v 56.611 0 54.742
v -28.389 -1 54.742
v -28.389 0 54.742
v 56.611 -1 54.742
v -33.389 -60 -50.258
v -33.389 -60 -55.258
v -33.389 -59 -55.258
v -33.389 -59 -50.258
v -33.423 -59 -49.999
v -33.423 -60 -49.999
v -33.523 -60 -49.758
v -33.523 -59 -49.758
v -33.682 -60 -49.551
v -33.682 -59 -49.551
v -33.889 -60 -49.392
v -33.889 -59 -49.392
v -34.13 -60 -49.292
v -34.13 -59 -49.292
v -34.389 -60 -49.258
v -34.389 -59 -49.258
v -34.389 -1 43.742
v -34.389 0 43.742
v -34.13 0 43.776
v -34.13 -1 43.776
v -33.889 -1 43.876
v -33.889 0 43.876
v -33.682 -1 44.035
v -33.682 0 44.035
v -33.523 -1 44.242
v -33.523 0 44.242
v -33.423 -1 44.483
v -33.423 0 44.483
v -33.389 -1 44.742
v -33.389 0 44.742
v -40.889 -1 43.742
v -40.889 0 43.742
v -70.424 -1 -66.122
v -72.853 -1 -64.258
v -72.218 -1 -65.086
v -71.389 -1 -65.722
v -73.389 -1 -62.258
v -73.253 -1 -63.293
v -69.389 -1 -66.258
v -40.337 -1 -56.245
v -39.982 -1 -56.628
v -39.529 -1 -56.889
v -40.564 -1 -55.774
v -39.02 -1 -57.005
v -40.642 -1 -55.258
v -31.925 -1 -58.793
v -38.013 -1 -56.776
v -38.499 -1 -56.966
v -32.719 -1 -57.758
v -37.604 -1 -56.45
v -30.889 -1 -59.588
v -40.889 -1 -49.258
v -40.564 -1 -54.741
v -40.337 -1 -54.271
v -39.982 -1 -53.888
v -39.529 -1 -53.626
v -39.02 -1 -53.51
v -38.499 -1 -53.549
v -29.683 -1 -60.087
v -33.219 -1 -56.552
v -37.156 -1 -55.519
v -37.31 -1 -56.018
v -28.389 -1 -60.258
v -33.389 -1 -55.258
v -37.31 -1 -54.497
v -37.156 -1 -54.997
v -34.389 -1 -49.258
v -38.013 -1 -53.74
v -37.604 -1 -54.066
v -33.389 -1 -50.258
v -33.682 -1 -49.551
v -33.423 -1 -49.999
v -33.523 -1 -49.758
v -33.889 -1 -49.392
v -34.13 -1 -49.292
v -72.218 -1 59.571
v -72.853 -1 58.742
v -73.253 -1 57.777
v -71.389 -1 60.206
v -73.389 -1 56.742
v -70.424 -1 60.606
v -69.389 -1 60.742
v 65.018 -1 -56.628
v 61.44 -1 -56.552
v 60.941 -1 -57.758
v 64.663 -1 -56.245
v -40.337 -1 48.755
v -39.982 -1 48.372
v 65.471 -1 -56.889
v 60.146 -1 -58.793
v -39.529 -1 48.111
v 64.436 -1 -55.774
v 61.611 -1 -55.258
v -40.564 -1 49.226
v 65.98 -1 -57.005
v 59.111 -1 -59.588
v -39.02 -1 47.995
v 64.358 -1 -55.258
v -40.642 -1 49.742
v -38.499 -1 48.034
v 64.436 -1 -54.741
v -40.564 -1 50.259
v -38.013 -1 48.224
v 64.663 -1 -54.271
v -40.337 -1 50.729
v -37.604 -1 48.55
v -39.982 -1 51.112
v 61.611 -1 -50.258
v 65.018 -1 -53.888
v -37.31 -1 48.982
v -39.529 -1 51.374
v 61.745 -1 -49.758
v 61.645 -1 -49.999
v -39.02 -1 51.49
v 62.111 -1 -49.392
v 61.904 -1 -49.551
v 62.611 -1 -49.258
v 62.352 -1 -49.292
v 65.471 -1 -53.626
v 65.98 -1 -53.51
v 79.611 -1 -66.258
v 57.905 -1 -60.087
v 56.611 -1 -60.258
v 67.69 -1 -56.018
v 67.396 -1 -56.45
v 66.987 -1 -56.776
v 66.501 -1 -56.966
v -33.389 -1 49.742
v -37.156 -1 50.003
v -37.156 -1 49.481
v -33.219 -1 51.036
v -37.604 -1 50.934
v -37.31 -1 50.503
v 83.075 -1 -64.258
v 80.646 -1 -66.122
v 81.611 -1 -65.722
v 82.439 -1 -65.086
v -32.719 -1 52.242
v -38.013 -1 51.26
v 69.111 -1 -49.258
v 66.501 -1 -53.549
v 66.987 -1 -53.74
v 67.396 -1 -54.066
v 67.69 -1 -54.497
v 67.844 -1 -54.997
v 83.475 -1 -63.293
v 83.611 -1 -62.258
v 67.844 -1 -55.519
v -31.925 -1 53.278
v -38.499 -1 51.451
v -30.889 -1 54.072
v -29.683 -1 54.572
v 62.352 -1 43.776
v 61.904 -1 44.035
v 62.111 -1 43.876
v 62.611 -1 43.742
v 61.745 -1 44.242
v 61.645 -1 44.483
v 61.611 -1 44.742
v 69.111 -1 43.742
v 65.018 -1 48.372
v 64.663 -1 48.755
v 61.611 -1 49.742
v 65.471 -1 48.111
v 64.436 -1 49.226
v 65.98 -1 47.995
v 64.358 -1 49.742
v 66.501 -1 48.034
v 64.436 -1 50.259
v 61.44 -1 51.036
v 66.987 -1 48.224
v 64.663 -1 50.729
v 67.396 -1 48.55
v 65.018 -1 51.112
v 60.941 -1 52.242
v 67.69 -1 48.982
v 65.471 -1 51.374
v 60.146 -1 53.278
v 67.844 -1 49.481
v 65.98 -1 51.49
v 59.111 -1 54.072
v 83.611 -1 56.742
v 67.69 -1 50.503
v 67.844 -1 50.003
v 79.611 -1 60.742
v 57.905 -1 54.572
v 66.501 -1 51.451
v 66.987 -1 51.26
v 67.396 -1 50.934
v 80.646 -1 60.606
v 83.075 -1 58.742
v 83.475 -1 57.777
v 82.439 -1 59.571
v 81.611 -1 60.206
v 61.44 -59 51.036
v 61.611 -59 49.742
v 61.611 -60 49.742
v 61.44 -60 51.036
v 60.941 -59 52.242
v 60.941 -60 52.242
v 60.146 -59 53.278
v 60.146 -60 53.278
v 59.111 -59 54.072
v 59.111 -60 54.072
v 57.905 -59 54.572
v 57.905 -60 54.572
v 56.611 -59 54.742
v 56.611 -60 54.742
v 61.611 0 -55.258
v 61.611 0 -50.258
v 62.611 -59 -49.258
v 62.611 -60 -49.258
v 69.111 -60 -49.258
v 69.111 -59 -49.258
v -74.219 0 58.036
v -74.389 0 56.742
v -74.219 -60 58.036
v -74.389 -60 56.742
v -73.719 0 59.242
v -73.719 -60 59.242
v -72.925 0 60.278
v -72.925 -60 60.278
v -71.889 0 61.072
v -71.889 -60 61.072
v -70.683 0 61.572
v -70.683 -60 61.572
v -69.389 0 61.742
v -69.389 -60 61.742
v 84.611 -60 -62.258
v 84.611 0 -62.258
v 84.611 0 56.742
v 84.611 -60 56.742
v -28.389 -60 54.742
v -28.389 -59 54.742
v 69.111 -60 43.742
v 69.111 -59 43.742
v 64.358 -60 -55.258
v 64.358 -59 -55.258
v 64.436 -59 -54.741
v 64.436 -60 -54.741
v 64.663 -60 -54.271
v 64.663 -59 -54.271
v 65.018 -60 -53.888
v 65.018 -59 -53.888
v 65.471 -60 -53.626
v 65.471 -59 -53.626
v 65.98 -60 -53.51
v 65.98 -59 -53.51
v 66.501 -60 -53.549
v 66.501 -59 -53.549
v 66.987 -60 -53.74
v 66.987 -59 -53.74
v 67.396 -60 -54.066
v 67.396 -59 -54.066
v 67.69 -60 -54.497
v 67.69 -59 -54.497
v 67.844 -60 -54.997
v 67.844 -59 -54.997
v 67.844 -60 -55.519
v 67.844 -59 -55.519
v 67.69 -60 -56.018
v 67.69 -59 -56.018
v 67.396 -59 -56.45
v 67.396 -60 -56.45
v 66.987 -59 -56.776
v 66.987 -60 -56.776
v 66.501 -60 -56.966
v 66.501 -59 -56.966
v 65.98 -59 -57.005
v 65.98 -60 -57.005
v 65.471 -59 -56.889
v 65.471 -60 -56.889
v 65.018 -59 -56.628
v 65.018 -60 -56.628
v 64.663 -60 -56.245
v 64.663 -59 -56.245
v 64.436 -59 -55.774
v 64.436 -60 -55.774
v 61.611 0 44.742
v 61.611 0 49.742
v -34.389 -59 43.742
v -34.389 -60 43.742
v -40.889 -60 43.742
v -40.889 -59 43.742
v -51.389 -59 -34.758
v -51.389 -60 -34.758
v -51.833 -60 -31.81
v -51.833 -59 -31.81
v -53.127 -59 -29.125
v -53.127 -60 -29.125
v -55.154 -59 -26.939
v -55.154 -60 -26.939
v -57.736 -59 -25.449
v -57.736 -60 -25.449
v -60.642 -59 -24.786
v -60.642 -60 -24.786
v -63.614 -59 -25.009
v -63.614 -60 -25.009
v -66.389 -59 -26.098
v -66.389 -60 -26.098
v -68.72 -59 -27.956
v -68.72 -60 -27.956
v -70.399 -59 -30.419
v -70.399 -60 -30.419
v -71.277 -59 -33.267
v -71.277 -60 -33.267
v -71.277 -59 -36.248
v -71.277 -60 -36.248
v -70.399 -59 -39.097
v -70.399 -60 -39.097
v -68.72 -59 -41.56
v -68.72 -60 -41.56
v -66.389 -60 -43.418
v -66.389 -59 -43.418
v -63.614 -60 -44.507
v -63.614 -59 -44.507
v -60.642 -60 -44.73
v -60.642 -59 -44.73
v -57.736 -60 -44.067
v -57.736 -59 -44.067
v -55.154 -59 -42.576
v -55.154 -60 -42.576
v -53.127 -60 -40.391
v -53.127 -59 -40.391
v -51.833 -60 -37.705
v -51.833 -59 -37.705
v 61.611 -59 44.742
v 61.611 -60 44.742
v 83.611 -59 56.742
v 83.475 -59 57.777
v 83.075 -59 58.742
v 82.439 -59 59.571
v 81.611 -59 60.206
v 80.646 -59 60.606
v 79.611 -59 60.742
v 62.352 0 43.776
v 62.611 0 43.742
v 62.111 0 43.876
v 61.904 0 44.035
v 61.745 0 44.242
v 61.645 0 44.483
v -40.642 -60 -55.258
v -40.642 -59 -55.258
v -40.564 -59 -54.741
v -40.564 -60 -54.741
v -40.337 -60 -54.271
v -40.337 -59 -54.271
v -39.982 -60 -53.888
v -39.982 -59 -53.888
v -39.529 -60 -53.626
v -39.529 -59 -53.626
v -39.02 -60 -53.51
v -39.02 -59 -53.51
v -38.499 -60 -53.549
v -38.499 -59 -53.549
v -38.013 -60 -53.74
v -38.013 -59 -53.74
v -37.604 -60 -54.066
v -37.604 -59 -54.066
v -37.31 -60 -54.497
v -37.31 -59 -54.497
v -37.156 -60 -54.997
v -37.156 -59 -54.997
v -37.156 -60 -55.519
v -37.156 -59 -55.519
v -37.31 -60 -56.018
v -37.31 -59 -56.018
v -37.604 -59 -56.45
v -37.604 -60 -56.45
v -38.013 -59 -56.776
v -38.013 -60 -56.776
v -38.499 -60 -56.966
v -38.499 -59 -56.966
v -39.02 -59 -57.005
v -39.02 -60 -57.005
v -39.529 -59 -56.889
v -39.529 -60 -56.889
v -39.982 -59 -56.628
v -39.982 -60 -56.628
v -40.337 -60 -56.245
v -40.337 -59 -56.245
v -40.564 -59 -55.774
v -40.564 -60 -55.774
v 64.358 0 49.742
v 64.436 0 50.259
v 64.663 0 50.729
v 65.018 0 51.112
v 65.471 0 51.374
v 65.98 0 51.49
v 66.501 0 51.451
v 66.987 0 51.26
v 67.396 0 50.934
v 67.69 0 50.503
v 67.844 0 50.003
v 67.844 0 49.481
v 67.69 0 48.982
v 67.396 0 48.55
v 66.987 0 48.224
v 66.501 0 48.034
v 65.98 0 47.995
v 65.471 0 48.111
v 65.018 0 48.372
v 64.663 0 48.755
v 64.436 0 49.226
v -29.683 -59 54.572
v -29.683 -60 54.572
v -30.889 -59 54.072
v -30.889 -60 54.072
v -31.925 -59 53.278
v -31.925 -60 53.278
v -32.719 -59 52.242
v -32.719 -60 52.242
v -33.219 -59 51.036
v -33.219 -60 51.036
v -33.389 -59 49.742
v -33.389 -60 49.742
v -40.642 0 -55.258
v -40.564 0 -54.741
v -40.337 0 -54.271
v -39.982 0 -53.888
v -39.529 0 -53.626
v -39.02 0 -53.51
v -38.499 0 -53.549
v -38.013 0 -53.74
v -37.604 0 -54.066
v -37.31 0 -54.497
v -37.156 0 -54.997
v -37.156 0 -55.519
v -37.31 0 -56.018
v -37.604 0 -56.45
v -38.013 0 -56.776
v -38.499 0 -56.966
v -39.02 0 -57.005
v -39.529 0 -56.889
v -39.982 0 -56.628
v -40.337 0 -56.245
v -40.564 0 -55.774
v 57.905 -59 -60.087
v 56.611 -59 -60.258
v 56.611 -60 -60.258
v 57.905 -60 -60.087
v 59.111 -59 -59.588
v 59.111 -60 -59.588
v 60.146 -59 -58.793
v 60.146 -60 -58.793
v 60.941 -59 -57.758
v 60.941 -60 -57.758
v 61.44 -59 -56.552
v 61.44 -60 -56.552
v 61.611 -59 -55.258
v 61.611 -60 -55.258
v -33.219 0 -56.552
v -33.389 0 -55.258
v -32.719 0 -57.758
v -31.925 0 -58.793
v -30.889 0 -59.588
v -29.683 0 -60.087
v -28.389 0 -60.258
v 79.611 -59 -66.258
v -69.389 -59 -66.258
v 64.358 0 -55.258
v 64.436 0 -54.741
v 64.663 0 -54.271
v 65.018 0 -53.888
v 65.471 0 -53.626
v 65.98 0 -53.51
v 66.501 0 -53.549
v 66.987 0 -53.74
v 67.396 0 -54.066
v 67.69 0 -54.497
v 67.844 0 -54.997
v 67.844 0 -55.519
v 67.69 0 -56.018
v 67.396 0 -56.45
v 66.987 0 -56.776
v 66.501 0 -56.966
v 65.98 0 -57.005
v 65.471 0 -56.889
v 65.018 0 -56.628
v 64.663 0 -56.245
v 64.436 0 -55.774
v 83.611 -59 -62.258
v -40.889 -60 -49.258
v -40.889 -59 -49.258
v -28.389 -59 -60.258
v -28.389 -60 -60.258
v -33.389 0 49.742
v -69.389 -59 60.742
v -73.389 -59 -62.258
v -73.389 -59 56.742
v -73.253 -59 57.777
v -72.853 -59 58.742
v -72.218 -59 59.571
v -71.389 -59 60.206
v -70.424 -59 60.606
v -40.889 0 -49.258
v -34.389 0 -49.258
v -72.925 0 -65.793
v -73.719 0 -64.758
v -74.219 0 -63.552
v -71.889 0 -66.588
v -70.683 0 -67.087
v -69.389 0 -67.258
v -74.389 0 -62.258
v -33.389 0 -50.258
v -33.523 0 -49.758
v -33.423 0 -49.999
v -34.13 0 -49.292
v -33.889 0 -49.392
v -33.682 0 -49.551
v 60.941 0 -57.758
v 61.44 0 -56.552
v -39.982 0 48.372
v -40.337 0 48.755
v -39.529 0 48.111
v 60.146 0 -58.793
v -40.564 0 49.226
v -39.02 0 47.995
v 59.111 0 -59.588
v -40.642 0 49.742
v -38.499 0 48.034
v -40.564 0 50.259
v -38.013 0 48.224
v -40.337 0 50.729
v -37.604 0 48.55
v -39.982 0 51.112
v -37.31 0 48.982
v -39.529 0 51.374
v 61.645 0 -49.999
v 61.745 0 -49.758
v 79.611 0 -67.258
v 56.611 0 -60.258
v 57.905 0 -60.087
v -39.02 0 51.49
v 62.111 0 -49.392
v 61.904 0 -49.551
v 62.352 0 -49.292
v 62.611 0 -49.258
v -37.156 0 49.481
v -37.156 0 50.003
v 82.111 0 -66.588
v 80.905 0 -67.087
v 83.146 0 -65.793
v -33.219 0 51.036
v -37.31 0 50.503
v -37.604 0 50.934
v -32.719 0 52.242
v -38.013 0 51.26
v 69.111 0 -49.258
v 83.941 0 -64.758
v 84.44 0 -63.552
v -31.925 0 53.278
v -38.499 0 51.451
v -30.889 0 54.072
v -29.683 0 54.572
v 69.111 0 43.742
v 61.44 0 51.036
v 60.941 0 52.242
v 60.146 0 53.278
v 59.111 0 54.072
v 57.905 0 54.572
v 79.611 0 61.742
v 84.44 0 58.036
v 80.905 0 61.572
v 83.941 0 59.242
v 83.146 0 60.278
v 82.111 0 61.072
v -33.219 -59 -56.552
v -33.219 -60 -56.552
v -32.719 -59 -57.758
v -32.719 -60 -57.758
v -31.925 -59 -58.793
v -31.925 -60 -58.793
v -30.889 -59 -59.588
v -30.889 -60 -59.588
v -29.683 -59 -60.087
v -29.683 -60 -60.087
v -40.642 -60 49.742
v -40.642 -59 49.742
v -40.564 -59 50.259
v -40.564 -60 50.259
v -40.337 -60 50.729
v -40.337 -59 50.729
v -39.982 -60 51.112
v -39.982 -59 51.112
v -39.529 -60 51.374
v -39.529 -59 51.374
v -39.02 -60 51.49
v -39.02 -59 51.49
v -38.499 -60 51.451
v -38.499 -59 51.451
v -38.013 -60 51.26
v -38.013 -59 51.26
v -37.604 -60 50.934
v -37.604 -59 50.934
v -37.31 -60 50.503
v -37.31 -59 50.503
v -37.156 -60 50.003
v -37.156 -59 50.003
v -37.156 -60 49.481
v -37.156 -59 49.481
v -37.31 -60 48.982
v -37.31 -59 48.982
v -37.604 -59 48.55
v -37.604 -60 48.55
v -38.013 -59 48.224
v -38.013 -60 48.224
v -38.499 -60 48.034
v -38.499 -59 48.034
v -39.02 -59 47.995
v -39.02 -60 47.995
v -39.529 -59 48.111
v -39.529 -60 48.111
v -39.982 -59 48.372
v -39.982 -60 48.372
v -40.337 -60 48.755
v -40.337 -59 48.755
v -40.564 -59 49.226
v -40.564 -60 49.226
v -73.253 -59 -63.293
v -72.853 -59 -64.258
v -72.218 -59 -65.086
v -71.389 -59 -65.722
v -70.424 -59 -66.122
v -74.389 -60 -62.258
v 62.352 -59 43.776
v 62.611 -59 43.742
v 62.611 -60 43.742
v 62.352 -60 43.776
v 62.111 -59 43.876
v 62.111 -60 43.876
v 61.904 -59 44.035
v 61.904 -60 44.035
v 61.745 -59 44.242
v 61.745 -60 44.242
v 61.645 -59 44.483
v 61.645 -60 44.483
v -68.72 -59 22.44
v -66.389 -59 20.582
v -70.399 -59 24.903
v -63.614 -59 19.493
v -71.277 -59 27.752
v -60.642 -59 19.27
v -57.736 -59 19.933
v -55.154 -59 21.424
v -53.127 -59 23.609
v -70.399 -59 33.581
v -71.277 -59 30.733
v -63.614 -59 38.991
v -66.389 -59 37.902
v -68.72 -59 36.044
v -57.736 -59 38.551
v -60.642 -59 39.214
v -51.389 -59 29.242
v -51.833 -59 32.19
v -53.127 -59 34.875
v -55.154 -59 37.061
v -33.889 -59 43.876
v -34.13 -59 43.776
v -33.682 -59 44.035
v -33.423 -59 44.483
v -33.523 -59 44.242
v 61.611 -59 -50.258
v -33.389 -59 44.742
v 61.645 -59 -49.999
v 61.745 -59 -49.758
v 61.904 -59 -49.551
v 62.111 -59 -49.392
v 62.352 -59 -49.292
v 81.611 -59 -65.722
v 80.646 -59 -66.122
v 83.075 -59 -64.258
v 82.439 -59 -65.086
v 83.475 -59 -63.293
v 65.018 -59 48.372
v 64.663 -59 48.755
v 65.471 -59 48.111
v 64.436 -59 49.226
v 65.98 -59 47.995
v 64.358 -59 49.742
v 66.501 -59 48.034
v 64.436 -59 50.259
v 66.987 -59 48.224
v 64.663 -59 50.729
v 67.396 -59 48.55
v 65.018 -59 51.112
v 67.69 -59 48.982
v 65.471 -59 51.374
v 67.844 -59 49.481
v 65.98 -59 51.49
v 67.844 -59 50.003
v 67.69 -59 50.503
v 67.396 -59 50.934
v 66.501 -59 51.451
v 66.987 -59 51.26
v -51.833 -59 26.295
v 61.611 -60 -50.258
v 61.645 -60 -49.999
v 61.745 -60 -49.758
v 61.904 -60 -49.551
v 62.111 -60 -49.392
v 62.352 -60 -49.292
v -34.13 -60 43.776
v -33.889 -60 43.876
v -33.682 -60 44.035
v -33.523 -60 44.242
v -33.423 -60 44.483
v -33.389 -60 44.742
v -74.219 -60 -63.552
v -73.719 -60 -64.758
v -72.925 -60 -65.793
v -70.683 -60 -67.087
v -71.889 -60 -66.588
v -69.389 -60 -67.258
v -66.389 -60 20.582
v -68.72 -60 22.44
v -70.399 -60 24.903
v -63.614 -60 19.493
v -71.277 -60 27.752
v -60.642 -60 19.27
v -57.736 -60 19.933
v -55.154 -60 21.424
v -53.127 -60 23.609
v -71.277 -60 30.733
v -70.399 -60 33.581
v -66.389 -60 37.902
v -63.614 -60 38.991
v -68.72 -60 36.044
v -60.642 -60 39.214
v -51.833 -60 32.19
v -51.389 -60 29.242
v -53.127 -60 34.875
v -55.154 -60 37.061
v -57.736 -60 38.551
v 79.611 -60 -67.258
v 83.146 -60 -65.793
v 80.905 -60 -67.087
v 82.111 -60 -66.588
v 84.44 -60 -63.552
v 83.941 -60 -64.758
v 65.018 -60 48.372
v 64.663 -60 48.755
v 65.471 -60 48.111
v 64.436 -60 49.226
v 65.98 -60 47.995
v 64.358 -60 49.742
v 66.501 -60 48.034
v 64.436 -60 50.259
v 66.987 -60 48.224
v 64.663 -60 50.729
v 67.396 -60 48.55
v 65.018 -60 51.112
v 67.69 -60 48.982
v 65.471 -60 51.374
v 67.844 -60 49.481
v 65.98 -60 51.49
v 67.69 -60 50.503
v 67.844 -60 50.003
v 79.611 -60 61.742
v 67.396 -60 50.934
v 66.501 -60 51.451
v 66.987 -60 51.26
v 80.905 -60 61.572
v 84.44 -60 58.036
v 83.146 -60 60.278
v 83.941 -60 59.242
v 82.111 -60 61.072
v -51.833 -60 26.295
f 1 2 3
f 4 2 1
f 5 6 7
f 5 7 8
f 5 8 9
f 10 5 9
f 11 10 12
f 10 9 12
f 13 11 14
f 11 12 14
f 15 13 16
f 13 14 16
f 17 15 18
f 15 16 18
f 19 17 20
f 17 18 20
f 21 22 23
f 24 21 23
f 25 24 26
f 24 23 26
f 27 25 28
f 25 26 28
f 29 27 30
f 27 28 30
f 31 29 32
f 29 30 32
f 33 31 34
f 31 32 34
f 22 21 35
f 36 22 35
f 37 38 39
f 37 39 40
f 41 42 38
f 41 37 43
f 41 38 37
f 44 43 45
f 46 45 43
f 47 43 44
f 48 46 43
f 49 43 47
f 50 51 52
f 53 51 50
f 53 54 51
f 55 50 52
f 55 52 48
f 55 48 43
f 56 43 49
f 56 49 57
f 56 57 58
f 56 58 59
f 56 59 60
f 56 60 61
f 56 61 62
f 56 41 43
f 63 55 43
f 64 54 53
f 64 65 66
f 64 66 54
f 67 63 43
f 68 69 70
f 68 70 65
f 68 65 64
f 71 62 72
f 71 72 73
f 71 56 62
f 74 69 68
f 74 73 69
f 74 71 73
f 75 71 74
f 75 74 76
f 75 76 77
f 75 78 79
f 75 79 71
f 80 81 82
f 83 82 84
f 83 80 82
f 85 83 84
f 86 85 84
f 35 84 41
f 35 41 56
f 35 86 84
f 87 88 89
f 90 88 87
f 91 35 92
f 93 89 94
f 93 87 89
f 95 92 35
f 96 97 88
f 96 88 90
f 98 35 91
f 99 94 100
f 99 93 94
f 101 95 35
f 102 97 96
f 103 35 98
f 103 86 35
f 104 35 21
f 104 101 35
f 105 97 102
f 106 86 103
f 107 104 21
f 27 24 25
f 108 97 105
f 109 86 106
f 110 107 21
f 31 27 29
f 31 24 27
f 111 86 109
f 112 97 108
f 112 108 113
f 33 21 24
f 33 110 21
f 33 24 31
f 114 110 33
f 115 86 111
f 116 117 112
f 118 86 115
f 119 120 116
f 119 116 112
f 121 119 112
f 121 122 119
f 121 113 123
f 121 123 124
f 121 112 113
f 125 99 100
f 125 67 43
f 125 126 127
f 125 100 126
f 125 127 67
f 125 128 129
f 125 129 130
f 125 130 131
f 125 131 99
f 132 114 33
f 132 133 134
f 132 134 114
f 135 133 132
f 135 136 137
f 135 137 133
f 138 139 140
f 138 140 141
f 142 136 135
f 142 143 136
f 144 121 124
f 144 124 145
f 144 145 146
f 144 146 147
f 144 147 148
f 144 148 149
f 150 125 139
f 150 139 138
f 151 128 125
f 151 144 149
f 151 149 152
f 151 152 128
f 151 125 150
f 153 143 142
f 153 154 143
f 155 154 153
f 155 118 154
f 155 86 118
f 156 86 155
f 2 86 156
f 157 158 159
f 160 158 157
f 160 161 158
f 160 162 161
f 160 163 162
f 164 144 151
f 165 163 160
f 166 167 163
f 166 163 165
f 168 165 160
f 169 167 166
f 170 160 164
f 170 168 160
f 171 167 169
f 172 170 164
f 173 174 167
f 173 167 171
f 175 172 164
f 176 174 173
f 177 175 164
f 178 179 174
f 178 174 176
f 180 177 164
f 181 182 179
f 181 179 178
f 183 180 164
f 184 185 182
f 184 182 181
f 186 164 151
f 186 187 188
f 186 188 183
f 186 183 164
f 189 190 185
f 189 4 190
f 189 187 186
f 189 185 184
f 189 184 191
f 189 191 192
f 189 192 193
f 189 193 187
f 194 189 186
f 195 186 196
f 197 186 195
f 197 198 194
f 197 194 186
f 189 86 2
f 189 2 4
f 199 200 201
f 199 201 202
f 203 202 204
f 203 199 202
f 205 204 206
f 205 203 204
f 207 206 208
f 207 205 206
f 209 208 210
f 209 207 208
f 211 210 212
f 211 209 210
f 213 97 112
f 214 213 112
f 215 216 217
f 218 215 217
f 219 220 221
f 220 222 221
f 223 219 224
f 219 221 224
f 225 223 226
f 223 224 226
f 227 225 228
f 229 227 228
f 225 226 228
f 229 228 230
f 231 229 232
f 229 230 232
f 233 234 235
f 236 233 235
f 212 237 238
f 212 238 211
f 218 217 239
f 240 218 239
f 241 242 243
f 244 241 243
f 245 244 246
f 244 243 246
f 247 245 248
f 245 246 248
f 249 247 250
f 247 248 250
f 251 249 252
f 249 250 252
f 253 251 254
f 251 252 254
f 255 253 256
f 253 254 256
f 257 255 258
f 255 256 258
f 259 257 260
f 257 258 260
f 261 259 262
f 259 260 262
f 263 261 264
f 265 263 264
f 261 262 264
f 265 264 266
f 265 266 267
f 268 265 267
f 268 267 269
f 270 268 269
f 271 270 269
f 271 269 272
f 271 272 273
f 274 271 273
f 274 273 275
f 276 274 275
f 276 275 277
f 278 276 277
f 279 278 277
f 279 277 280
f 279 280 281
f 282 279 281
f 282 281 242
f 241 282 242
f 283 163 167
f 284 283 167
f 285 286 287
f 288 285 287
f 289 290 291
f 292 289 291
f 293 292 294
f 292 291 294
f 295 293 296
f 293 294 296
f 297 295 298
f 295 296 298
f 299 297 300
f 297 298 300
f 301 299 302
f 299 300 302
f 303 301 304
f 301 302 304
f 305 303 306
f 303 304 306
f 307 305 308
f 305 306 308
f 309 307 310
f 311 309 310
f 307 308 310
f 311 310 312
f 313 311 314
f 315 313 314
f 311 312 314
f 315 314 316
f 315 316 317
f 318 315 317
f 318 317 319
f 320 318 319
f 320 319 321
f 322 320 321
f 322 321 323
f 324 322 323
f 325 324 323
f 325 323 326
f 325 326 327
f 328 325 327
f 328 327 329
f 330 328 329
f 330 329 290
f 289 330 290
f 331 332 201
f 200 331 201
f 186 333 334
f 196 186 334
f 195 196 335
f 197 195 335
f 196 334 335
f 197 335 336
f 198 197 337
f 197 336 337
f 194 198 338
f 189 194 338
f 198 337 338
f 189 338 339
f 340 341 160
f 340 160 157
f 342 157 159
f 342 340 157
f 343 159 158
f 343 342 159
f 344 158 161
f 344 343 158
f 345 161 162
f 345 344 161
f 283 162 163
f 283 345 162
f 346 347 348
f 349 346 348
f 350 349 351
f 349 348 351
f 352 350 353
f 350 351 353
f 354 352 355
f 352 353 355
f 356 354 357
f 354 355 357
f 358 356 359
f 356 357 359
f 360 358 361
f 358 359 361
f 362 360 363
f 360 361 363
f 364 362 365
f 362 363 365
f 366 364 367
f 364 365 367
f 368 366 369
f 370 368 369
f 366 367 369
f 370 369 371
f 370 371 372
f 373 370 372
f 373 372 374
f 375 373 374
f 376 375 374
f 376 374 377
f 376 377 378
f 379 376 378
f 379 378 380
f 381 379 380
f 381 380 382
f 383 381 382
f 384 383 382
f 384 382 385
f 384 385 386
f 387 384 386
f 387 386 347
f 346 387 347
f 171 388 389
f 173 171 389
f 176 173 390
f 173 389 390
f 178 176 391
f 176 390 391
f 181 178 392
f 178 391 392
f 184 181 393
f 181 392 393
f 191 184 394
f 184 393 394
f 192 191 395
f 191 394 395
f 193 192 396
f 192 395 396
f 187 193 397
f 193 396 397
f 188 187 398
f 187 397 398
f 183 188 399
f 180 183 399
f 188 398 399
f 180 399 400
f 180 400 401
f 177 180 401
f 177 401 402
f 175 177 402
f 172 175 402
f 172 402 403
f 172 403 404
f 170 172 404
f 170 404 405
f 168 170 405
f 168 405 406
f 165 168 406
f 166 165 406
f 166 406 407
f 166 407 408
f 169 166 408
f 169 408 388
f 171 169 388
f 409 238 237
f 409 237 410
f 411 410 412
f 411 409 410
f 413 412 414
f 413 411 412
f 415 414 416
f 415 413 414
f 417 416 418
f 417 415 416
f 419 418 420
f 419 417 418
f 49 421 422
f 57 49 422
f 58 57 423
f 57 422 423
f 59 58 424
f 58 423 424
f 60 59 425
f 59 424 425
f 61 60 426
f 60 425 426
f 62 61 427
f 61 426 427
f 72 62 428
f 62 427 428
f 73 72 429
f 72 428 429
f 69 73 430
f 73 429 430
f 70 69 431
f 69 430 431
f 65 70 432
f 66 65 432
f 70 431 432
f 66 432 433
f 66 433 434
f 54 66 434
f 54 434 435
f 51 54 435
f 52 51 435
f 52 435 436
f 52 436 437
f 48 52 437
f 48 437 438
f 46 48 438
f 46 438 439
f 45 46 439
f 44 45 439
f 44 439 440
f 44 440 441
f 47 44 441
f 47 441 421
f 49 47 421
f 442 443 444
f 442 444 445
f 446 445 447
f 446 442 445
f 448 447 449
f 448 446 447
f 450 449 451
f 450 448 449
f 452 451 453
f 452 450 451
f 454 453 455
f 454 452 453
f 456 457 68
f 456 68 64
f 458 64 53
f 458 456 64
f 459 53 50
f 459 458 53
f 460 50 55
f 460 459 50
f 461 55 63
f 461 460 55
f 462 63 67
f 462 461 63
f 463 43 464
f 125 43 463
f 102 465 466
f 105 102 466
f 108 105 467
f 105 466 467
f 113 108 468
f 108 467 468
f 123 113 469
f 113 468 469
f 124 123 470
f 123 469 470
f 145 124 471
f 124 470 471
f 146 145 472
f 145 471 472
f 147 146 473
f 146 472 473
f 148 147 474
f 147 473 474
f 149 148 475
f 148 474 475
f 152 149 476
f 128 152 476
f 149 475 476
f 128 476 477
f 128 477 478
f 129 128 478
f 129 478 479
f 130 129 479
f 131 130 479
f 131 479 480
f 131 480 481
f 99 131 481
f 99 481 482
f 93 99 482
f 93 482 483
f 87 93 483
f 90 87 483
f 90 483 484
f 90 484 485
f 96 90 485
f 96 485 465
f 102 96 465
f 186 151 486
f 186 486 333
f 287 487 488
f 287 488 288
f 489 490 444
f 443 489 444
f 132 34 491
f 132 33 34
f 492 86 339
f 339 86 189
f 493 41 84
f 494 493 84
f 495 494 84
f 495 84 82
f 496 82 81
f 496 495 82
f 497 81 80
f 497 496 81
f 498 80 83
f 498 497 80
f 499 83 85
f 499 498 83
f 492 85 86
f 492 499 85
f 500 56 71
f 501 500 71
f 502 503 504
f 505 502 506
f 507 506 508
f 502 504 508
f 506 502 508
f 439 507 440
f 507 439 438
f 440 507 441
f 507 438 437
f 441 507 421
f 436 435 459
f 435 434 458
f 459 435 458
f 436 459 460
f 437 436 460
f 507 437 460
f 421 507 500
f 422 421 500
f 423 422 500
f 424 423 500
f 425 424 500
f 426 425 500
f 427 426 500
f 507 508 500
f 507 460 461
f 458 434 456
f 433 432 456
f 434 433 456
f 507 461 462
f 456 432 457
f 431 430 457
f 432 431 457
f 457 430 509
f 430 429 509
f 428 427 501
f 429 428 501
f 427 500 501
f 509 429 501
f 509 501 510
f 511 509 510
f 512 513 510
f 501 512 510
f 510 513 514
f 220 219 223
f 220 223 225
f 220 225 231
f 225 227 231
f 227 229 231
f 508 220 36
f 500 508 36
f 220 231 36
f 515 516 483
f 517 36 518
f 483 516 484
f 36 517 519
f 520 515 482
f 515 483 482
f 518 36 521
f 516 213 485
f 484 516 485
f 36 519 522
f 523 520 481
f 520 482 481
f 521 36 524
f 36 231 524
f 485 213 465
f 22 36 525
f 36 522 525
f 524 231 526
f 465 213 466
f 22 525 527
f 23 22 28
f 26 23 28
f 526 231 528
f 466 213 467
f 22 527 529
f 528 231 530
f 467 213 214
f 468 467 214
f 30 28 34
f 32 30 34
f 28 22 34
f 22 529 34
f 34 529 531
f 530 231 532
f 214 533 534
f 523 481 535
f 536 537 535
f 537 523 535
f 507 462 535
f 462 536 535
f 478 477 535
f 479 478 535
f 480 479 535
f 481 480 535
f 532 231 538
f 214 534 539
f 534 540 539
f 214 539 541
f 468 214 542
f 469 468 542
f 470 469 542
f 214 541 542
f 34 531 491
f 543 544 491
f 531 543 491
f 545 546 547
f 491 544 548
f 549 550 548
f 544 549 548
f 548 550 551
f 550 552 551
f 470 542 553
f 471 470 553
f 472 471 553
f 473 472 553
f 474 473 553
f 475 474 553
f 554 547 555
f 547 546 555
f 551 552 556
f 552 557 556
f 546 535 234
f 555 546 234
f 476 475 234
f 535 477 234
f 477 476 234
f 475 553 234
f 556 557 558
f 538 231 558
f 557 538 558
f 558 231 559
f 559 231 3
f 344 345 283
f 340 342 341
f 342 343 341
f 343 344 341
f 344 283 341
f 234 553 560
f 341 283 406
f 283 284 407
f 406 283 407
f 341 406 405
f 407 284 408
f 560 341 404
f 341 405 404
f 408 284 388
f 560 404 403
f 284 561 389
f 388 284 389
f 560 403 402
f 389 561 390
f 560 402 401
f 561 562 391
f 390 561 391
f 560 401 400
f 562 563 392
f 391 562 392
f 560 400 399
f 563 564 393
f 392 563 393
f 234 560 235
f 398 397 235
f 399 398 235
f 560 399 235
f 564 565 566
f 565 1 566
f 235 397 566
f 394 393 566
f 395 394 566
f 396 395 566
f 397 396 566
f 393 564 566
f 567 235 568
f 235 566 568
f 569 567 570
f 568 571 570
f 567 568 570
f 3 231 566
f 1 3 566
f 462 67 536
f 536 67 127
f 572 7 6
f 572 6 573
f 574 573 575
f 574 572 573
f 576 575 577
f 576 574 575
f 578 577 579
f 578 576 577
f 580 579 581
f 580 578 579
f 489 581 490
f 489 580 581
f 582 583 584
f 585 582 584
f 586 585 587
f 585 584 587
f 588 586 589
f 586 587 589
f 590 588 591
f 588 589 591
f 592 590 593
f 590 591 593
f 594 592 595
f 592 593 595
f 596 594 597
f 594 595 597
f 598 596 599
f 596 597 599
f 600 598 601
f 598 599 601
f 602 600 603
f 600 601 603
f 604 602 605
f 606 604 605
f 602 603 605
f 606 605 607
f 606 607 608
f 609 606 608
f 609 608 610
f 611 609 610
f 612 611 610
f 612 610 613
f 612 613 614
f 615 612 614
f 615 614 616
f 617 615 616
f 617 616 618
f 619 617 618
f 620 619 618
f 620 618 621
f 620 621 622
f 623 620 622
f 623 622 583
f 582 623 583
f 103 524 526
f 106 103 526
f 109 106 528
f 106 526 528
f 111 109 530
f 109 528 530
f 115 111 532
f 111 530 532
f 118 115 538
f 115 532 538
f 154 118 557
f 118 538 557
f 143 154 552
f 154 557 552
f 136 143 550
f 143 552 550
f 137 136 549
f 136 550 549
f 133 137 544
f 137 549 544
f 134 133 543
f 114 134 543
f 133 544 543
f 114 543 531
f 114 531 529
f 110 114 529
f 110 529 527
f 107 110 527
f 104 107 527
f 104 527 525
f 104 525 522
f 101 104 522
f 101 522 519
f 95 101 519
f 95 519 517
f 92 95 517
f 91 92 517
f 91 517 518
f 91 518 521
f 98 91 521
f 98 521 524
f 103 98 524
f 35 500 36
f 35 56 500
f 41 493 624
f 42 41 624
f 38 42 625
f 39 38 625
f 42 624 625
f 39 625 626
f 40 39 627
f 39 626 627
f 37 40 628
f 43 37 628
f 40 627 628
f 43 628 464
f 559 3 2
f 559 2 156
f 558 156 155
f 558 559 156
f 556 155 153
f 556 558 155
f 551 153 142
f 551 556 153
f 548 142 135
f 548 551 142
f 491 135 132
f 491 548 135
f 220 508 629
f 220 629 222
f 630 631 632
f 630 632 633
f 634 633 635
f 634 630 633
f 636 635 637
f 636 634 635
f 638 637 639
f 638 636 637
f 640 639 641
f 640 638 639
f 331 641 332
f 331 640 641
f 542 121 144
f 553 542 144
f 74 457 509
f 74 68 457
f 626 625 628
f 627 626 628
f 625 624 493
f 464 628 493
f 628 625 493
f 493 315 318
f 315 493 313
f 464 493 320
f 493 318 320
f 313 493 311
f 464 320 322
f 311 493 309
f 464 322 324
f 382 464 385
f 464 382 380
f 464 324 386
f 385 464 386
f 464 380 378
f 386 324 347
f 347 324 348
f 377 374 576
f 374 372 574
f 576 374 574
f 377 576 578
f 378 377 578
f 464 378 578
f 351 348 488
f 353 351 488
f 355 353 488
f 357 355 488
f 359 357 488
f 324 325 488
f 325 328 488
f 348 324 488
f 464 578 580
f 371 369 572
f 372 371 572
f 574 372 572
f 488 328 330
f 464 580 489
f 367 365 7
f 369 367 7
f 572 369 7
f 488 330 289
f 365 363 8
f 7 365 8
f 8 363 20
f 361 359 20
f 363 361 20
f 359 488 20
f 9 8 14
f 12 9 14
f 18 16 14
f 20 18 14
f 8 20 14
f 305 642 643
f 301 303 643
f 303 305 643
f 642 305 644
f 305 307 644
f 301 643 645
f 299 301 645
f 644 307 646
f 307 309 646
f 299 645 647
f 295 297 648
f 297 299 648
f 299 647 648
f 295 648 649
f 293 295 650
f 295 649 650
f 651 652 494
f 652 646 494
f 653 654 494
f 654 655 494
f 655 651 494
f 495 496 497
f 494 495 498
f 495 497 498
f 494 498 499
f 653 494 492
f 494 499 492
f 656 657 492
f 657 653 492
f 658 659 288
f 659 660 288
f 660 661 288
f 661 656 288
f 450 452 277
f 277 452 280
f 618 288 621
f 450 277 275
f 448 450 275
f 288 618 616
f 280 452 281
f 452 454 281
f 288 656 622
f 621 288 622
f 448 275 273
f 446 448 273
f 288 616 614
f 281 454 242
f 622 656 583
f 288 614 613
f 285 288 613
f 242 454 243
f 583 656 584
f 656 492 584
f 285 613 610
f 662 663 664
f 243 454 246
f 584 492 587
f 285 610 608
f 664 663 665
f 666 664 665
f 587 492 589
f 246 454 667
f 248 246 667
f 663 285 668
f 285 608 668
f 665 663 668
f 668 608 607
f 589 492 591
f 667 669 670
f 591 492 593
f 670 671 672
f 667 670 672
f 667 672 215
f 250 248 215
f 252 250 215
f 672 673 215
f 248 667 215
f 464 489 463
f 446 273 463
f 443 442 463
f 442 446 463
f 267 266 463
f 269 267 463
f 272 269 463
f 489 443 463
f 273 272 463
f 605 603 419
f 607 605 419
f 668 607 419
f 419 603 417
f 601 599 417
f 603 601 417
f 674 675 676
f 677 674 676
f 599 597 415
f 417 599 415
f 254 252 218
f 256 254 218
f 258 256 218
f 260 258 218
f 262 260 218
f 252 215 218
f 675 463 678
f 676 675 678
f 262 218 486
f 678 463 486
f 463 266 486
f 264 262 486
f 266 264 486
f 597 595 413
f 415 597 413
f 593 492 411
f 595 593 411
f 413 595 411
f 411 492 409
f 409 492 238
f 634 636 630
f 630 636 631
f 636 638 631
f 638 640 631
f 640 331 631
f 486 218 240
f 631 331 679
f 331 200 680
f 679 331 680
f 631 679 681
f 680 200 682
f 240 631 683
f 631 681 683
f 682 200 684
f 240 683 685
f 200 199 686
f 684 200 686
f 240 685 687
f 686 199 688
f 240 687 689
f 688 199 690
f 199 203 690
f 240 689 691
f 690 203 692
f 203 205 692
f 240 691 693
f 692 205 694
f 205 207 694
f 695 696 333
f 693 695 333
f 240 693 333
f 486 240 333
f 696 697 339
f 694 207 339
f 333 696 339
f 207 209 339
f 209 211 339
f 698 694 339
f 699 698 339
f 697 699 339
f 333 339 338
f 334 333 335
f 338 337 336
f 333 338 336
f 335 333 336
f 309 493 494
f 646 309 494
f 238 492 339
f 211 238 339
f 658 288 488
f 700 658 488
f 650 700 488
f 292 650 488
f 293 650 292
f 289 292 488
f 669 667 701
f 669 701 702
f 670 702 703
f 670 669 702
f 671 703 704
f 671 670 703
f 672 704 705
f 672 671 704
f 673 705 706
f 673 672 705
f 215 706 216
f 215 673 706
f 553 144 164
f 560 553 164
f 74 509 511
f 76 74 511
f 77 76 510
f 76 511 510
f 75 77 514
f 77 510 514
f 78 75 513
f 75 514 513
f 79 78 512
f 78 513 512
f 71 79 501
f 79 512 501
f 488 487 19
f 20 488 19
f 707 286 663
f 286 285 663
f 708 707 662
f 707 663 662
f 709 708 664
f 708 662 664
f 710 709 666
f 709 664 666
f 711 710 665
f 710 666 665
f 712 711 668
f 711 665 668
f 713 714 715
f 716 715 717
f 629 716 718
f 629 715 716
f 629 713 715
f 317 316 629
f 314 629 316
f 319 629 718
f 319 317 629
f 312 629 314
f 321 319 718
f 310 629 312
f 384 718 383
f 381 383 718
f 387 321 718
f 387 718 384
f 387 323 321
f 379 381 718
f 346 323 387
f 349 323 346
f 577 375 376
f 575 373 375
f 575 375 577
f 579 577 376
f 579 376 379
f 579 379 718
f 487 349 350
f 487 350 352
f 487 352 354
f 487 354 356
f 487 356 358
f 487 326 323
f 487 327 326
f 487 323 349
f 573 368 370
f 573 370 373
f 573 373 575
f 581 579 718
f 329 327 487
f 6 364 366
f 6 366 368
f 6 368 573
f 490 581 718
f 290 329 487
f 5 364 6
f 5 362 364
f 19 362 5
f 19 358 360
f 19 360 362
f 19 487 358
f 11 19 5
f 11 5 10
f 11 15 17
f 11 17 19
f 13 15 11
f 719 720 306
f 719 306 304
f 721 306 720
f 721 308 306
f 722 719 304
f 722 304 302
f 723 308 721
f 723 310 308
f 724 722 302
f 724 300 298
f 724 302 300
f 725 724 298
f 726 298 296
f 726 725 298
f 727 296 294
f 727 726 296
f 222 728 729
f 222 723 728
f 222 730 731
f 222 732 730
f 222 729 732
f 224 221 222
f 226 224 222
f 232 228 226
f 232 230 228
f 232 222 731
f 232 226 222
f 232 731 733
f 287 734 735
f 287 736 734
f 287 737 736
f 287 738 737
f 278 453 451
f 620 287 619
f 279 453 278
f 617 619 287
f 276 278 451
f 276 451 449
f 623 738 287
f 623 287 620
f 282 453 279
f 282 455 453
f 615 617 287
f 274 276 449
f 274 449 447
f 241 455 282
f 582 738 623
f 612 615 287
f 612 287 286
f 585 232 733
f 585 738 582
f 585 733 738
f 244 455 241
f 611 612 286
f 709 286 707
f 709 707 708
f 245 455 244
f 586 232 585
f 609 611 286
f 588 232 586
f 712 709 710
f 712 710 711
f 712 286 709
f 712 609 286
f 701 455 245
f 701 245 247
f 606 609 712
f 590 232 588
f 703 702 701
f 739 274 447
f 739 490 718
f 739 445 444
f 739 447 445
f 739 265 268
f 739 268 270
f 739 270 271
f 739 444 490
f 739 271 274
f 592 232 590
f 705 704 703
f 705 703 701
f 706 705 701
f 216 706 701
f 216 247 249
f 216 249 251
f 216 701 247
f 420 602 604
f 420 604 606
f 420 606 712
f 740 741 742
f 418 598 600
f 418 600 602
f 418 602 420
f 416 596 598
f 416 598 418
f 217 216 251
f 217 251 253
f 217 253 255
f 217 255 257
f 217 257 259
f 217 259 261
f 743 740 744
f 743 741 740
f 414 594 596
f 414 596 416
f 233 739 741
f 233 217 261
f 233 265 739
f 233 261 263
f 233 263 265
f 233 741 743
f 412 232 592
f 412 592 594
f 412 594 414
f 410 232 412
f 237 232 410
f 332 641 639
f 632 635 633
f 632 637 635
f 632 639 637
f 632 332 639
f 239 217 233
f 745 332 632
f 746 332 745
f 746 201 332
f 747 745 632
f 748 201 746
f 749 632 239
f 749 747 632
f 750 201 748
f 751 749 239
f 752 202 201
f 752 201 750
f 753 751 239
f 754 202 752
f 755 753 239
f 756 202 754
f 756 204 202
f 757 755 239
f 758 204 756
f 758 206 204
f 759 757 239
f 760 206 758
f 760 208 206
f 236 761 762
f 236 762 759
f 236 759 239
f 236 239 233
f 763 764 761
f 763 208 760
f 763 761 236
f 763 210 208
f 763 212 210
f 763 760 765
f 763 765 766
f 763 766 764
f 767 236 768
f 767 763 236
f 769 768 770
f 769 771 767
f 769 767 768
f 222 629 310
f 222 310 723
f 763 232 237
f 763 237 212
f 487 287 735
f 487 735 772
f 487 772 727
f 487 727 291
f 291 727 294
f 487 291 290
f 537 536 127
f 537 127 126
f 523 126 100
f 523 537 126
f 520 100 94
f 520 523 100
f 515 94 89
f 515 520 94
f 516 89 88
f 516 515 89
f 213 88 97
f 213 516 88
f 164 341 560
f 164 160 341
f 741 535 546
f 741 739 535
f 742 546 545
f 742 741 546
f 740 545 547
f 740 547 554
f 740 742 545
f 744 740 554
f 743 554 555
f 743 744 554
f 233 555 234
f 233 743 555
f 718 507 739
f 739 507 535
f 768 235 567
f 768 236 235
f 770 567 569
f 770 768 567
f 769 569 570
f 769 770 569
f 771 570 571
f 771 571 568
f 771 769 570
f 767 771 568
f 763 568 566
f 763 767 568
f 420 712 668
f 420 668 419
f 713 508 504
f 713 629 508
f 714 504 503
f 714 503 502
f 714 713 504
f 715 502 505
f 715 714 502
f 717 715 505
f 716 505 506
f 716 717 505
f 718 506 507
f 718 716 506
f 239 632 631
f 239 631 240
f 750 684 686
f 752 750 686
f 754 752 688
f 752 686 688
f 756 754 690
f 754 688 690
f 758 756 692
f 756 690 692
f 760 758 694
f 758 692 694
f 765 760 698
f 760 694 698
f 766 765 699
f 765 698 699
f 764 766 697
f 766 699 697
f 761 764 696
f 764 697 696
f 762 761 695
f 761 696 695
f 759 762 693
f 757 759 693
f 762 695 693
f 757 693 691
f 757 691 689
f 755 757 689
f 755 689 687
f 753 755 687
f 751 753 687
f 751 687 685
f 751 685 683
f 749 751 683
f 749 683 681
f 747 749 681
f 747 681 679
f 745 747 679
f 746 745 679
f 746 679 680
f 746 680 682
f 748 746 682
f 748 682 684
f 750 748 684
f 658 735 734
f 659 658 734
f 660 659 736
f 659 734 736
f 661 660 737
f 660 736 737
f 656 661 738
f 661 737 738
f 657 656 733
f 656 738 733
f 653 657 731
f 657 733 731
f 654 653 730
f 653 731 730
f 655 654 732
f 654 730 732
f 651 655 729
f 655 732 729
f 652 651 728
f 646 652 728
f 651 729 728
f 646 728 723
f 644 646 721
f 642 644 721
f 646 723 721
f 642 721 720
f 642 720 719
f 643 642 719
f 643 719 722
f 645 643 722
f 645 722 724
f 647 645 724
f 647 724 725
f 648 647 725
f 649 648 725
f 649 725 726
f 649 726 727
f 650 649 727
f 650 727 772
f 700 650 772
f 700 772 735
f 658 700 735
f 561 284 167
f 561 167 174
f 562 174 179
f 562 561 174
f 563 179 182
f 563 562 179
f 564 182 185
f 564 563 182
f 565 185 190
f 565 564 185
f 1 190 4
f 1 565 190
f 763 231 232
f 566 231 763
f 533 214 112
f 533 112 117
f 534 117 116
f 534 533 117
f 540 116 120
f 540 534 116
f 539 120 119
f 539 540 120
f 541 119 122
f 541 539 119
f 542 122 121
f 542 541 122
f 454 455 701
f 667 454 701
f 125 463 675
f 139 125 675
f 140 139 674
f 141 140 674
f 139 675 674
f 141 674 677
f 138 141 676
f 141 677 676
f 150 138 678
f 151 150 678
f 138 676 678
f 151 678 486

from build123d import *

# Parameters (mm, degrees)
F0_W      = 159
F0_H      = 129
F1_DEPTH  = 60
F2_R      = 5
F3_W      = 7.5
F3_H      = 93
F3_W_2    = 95
F3_H_2    = 11
F4_DEPTH  = 97
F5_R      = 5
F6_R      = 1
F7_T      = -1
F9_D      = 3.505
F10_R     = 10
F11_DEPTH = 10


with BuildPart() as f1:
    # F0 (on Front) → F1 (new body)
    with BuildSketch(Plane.XZ):
        with Locations((5.1108691841, -2.7578008189)):
            Rectangle(F0_W, F0_H)
    extrude(amount=F1_DEPTH)

    # F2
    f2_edges = [f1.edges().sort_by_distance(p)[0] for p in [
        (84.610869, -30, -67.257801),
        (84.610869, -30, 61.742199),
        (-74.389131, -30, 61.742199),
        (-74.389131, -30, -67.257801),
    ]]
    fillet(f2_edges, radius=F2_R)

    # F3 (on face) → F4 (cut)
    with BuildSketch(Plane.XZ.offset(60)):
        with Locations((-37.1391308159, -2.7578008189)):
            Rectangle(F3_W, F3_H)
        with Locations((14.1108691841, -2.7578008189)):
            Rectangle(F3_W_2, F3_H)
        with Locations((14.1108691841, 49.2421991811)):
            Rectangle(F3_W_2, F3_H_2)
        with Locations((65.3608691841, -2.7578008189)):
            Rectangle(F3_W, F3_H)
        with Locations((14.1108691841, -54.7578008189)):
            Rectangle(F3_W_2, F3_H_2)
    extrude(amount=-F4_DEPTH, mode=Mode.SUBTRACT)

    # F5
    f5_edges = [f1.edges().sort_by_distance(p)[0] for p in [
        (-33.389131, -30, 54.742199),
        (61.610869, -30, 54.742199),
        (61.610869, -30, -60.257801),
        (-33.389131, -30, -60.257801),
    ]]
    fillet(f5_edges, radius=F5_R)

    # F6
    f6_edges = [f1.edges().sort_by_distance(p)[0] for p in [
        (-33.389131, -30, 43.742199),
        (61.610869, -30, 43.742199),
        (61.610869, -30, -49.257801),
        (-33.389131, -30, -49.257801),
    ]]
    fillet(f6_edges, radius=F6_R)

    # F7
    f7_openings = [f1.faces().sort_by_distance(p)[0] for p in [
        (-37.639131, -30, 43.742199),
        (-33.389131, -30, 47.242199),
        (-31.924665, -30, 53.277733),
        (14.110869, -30, 54.742199),
        (60.146403, -30, 53.277733),
        (61.610869, -30, 47.242199),
        (65.860869, -30, 43.742199),
        (69.110869, -30, -2.757801),
        (65.860869, -30, -49.257801),
        (61.610869, -30, -52.757801),
        (60.146403, -30, -58.793335),
        (14.110869, -30, -60.257801),
        (-31.924665, -30, -58.793335),
        (-33.389131, -30, -52.757801),
        (-37.639131, -30, -49.257801),
        (-40.889131, -30, -2.757801),
        (-33.682024, -30, 44.035092),
        (61.903762, -30, 44.035092),
        (61.903762, -30, -49.550694),
        (-33.682024, -30, -49.550694),
    ]]
    offset(amount=F7_T, openings=f7_openings)

    # F9 (through all)
    with Locations(Plane.XZ.offset(60)):
        with Locations((-38.8891308159, 49.7421991811), (66.1108691841, 49.7421991811), (66.1108691841, -55.2578008189), (-38.8891308159, -55.2578008189)):
            Hole(F9_D / 2)

    # F10 (on face) → F11 (cut)
    with BuildSketch(Plane.XZ.offset(60)):
        with Locations((-61.3891308159, 29.2421991811)):
            Circle(F10_R)
        with Locations((-61.3891308159, -34.7578008189)):
            Circle(F10_R)
    extrude(amount=-F11_DEPTH, mode=Mode.SUBTRACT)


solid = f1.part
